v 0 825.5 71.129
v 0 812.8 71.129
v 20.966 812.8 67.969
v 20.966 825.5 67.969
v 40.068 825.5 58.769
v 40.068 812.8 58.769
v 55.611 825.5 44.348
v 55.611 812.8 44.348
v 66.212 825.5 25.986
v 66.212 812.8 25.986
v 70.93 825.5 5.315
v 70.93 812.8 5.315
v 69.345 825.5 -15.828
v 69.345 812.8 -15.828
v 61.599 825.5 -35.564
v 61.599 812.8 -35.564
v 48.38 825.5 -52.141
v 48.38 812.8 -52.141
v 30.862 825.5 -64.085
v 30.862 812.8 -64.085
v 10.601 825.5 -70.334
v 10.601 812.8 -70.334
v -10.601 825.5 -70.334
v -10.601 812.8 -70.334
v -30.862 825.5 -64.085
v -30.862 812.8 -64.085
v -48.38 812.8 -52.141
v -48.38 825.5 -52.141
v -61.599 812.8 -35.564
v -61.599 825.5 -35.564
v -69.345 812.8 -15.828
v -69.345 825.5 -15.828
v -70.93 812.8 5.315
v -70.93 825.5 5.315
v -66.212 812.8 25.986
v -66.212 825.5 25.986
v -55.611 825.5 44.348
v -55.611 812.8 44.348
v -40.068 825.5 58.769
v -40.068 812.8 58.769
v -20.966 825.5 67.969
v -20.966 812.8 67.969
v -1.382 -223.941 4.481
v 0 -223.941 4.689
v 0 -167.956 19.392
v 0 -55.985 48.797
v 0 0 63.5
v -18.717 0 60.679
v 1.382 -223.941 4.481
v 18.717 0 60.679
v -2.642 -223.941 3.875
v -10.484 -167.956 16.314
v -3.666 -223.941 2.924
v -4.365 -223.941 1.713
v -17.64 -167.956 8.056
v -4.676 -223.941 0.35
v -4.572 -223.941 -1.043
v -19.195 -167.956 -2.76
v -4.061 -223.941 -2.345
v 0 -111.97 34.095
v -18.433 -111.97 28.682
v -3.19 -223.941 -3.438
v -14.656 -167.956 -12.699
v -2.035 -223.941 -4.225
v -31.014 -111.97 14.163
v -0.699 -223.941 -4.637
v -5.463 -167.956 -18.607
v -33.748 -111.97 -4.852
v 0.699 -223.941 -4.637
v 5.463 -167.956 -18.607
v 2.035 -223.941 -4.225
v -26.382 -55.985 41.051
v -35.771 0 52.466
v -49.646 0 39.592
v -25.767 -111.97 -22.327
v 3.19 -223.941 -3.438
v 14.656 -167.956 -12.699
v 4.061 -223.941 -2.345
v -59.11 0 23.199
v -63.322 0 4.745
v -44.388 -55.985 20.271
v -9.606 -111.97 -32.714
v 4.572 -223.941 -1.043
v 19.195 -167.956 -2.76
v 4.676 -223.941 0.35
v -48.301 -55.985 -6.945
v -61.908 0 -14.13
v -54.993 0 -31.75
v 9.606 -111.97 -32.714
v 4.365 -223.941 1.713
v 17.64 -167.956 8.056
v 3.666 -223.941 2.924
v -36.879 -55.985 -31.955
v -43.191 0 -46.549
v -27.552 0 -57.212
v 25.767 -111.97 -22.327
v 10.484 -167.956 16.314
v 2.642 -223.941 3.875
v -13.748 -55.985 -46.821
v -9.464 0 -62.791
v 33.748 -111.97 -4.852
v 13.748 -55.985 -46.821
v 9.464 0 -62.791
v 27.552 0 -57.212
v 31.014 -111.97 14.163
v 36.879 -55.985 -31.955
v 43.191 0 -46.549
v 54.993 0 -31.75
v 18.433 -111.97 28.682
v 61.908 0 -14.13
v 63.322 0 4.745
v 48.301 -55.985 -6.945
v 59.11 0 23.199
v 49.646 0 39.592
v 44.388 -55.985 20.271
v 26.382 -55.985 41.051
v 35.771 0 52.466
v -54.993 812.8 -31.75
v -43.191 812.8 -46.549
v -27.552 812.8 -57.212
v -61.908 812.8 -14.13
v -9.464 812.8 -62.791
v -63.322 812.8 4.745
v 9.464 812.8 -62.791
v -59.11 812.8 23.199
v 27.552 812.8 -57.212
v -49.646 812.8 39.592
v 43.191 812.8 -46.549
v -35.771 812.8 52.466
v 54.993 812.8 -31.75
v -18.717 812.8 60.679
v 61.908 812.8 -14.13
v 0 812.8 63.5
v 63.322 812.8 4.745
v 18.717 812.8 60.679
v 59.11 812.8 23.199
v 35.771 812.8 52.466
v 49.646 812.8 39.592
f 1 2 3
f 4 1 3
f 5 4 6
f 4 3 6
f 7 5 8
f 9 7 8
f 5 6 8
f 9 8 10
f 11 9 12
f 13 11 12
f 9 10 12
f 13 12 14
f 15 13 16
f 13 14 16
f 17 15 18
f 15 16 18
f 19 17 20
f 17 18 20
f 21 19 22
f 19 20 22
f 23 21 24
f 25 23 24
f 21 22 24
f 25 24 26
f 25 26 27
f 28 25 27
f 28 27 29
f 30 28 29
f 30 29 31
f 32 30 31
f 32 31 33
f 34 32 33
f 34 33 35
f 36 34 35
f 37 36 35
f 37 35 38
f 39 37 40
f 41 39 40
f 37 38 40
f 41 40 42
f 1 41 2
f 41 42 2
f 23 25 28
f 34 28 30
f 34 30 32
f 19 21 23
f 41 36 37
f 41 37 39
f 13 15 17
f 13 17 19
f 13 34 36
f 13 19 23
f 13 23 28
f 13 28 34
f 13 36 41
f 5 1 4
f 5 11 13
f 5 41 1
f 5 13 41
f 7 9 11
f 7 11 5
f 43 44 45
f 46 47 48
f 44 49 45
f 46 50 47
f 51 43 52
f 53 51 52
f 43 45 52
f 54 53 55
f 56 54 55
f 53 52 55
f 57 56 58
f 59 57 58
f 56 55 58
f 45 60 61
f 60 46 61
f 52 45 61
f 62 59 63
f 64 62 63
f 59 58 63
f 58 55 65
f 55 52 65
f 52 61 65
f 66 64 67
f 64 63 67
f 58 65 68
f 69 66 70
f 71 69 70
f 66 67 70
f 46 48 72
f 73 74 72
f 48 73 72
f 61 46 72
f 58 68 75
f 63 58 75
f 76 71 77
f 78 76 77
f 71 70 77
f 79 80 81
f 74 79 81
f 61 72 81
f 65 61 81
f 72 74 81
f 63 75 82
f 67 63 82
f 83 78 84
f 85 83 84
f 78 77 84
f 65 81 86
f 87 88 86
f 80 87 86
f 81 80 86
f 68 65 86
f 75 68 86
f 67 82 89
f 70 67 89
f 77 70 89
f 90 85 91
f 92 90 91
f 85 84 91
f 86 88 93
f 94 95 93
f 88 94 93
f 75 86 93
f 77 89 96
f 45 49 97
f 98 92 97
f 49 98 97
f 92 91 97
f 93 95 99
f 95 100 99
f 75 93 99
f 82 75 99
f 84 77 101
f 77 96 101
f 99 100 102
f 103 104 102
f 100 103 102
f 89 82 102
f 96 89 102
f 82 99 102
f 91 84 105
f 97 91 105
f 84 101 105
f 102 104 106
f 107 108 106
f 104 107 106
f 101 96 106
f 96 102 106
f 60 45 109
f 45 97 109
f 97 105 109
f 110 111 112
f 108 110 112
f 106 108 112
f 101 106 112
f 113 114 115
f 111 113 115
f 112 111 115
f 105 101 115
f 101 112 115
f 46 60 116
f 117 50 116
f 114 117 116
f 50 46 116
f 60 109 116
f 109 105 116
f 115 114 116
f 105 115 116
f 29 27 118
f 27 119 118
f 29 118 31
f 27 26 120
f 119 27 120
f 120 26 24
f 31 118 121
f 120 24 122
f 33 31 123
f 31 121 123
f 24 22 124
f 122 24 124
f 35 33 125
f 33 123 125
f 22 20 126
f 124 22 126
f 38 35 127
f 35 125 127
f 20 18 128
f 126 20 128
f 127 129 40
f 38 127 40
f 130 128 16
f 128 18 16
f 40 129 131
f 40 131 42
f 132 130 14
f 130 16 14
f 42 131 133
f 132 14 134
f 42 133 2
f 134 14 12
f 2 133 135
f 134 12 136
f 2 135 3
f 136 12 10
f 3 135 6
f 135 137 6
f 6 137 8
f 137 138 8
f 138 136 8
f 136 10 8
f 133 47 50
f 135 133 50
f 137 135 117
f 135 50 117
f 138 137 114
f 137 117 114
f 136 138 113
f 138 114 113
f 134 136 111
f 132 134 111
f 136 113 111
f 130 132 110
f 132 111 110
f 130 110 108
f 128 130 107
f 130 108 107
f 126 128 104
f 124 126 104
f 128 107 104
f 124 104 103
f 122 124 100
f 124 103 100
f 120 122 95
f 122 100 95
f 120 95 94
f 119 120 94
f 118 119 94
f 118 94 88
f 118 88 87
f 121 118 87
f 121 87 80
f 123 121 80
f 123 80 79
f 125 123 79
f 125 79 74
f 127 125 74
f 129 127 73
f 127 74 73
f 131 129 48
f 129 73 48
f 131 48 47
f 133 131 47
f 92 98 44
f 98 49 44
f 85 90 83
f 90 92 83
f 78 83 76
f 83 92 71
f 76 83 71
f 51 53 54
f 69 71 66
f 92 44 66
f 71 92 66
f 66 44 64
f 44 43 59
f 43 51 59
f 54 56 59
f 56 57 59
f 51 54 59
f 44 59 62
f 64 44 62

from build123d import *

# Parameters (mm, degrees)
SKETCH1_R           = 63.5
BOSS_EXTRUDE1_DEPTH = 812.8
SKETCH2_R           = 71.128555951
BOSS_EXTRUDE2_DEPTH = 12.7


with BuildPart() as part:
    # Sketch1 → Boss-Extrude1 (new body)
    with BuildSketch(Plane(origin=(0, 0, 0), x_dir=(1, 0, 0), z_dir=(0, 1, 0))):
        with Locations(Location((0, 0, 0), (0, 0, 270))):
            Circle(SKETCH1_R)
    extrude(amount=BOSS_EXTRUDE1_DEPTH)

    # Sketch2 → Boss-Extrude2 (add)
    with BuildSketch(Plane(origin=(0, 812.8, 0), x_dir=(1, 0, 0), z_dir=(0, 1, 0))):
        with Locations(Location((0, 0, 0), (0, 0, 270))):
            Circle(SKETCH2_R)
    extrude(amount=BOSS_EXTRUDE2_DEPTH)

    # Sketch5 → Revolve2 (revolve)
    with BuildSketch(Plane(origin=(0, 0, 0), x_dir=(0, 0, -1), z_dir=(1, 0, 0))):
        Polygon((-63.5, 0), (0, 0), (0, -223.940998137), (-4.689426477, -223.940998137), align=None)
    revolve(axis=Axis((0, 0, 0), (0, -1, 0)))


solid = part.part
